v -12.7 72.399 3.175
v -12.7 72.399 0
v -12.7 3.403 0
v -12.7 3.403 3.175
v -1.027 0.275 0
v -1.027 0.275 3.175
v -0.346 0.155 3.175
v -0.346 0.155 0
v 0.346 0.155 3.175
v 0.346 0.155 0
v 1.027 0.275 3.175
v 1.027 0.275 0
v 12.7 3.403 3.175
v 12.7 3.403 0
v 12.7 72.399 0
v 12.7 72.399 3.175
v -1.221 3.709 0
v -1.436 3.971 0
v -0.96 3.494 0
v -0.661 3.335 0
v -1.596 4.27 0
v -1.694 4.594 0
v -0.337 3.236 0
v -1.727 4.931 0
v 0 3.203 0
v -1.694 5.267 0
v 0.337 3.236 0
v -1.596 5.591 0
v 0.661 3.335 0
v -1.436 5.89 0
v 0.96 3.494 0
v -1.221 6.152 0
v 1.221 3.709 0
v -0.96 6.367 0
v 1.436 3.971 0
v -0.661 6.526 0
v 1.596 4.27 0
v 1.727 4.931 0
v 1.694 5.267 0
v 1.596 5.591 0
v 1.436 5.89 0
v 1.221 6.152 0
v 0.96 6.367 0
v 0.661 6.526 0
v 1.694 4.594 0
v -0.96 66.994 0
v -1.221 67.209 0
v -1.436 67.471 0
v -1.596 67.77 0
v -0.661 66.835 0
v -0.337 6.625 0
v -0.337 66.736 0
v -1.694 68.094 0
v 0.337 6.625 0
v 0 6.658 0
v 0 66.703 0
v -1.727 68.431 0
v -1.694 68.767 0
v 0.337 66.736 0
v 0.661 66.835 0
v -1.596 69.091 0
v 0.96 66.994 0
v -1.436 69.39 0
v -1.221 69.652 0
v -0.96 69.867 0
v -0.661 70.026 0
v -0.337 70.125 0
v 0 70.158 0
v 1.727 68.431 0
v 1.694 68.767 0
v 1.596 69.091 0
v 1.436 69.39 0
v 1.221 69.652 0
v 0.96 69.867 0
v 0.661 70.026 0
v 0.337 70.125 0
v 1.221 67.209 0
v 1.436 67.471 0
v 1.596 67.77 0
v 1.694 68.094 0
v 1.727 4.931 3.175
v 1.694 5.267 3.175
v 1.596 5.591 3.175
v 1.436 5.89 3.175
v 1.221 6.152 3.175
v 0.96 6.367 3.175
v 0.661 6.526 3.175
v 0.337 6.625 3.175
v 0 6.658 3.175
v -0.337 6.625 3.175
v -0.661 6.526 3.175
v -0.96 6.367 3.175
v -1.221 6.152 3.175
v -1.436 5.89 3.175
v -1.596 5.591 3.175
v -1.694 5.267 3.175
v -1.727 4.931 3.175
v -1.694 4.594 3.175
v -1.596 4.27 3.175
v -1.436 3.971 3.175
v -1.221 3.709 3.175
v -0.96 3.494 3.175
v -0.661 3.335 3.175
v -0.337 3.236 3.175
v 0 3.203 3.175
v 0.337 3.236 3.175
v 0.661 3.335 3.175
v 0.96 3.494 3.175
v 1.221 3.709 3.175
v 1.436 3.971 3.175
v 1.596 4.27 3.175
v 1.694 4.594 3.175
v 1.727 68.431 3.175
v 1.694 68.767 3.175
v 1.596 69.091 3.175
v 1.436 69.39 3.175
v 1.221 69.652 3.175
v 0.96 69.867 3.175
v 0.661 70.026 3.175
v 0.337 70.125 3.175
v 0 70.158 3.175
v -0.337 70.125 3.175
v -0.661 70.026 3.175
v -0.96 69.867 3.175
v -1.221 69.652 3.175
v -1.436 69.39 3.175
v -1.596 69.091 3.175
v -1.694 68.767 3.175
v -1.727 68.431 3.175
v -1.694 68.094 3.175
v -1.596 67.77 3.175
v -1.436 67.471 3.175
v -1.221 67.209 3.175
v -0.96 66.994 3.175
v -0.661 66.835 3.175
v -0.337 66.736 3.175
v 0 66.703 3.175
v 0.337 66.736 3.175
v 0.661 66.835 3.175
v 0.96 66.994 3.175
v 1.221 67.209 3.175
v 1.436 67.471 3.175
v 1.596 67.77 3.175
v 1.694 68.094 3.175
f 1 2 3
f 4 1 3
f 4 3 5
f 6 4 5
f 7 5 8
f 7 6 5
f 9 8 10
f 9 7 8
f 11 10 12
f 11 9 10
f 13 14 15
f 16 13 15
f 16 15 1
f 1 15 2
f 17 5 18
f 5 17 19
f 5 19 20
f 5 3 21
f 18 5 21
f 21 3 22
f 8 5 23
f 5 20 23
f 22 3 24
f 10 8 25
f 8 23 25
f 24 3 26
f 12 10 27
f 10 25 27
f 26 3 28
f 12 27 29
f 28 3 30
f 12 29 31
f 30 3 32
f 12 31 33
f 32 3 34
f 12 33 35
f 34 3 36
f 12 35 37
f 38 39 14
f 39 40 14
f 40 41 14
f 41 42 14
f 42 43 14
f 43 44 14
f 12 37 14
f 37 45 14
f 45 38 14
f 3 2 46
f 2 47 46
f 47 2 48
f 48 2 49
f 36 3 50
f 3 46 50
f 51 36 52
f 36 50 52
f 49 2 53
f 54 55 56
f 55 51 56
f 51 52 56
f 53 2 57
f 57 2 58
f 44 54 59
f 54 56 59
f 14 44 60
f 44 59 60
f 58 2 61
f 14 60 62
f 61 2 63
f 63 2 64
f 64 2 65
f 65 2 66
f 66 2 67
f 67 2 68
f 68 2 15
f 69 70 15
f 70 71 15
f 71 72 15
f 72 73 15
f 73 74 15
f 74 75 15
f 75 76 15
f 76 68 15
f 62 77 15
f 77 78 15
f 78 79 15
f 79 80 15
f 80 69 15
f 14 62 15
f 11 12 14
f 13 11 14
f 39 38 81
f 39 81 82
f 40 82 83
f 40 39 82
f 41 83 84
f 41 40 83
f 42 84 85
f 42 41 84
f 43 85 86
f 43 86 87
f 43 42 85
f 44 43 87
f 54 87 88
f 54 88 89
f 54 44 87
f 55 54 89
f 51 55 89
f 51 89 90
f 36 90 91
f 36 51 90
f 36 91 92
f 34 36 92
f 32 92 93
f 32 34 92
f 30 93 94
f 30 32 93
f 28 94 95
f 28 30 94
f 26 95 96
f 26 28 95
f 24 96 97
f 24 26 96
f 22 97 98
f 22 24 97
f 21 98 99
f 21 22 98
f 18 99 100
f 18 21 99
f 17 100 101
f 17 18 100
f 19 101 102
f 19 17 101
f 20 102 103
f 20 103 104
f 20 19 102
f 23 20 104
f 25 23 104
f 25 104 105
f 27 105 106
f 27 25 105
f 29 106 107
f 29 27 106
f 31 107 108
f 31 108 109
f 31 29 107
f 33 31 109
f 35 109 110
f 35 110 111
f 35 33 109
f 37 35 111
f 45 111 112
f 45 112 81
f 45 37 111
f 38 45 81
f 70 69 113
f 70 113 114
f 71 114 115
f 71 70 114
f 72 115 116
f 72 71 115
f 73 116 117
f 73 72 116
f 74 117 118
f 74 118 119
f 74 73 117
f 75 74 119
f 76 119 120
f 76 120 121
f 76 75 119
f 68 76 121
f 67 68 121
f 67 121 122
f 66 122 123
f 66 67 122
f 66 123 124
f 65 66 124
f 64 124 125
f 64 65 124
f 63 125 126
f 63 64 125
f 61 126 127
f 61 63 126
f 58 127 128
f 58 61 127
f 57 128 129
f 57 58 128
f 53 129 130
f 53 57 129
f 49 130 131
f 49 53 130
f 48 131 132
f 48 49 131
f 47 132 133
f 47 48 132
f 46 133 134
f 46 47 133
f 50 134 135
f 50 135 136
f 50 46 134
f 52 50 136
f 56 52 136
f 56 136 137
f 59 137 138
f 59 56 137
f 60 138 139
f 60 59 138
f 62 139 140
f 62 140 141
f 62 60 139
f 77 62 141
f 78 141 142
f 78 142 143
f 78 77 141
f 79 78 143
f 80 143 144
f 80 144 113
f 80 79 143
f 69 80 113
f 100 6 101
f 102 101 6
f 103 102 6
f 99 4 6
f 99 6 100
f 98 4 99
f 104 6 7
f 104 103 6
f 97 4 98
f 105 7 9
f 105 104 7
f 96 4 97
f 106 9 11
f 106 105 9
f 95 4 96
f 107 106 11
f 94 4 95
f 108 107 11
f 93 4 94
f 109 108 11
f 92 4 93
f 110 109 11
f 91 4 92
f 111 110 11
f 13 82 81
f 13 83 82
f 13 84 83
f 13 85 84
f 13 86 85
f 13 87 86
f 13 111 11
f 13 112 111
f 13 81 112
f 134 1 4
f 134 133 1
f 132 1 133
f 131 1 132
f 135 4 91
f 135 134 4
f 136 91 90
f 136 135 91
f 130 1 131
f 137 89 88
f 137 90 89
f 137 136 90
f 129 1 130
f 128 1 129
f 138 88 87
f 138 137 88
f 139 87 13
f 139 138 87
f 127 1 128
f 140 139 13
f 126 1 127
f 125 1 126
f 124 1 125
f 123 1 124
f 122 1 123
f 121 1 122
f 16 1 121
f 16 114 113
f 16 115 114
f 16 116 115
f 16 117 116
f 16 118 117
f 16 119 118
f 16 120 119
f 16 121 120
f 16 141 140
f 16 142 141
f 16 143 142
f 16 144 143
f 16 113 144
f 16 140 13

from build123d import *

# Parameters (mm, degrees)
F0_R     = 1.7272
F1_DEPTH = 3.175
F2_R     = 3.96875


with BuildPart() as f1:
    # F0 (on Top) → F1 (new body)
    with BuildSketch(Plane.XY):
        Polygon((-12.7, 3.402955), (0, 0), (12.7, 3.402955), (12.7, 72.399253), (-12.7, 72.399253), align=None)
        with Locations((0, 4.930503)):
            Circle(F0_R, mode=Mode.SUBTRACT)
        with Locations((0, 68.430503)):
            Circle(F0_R, mode=Mode.SUBTRACT)
    extrude(amount=F1_DEPTH)

    # F2
    f2_edges = [f1.edges().sort_by_distance(p)[0] for p in [
        (0, 0, 1.5875),
    ]]
    fillet(f2_edges, radius=F2_R)


solid = f1.part
